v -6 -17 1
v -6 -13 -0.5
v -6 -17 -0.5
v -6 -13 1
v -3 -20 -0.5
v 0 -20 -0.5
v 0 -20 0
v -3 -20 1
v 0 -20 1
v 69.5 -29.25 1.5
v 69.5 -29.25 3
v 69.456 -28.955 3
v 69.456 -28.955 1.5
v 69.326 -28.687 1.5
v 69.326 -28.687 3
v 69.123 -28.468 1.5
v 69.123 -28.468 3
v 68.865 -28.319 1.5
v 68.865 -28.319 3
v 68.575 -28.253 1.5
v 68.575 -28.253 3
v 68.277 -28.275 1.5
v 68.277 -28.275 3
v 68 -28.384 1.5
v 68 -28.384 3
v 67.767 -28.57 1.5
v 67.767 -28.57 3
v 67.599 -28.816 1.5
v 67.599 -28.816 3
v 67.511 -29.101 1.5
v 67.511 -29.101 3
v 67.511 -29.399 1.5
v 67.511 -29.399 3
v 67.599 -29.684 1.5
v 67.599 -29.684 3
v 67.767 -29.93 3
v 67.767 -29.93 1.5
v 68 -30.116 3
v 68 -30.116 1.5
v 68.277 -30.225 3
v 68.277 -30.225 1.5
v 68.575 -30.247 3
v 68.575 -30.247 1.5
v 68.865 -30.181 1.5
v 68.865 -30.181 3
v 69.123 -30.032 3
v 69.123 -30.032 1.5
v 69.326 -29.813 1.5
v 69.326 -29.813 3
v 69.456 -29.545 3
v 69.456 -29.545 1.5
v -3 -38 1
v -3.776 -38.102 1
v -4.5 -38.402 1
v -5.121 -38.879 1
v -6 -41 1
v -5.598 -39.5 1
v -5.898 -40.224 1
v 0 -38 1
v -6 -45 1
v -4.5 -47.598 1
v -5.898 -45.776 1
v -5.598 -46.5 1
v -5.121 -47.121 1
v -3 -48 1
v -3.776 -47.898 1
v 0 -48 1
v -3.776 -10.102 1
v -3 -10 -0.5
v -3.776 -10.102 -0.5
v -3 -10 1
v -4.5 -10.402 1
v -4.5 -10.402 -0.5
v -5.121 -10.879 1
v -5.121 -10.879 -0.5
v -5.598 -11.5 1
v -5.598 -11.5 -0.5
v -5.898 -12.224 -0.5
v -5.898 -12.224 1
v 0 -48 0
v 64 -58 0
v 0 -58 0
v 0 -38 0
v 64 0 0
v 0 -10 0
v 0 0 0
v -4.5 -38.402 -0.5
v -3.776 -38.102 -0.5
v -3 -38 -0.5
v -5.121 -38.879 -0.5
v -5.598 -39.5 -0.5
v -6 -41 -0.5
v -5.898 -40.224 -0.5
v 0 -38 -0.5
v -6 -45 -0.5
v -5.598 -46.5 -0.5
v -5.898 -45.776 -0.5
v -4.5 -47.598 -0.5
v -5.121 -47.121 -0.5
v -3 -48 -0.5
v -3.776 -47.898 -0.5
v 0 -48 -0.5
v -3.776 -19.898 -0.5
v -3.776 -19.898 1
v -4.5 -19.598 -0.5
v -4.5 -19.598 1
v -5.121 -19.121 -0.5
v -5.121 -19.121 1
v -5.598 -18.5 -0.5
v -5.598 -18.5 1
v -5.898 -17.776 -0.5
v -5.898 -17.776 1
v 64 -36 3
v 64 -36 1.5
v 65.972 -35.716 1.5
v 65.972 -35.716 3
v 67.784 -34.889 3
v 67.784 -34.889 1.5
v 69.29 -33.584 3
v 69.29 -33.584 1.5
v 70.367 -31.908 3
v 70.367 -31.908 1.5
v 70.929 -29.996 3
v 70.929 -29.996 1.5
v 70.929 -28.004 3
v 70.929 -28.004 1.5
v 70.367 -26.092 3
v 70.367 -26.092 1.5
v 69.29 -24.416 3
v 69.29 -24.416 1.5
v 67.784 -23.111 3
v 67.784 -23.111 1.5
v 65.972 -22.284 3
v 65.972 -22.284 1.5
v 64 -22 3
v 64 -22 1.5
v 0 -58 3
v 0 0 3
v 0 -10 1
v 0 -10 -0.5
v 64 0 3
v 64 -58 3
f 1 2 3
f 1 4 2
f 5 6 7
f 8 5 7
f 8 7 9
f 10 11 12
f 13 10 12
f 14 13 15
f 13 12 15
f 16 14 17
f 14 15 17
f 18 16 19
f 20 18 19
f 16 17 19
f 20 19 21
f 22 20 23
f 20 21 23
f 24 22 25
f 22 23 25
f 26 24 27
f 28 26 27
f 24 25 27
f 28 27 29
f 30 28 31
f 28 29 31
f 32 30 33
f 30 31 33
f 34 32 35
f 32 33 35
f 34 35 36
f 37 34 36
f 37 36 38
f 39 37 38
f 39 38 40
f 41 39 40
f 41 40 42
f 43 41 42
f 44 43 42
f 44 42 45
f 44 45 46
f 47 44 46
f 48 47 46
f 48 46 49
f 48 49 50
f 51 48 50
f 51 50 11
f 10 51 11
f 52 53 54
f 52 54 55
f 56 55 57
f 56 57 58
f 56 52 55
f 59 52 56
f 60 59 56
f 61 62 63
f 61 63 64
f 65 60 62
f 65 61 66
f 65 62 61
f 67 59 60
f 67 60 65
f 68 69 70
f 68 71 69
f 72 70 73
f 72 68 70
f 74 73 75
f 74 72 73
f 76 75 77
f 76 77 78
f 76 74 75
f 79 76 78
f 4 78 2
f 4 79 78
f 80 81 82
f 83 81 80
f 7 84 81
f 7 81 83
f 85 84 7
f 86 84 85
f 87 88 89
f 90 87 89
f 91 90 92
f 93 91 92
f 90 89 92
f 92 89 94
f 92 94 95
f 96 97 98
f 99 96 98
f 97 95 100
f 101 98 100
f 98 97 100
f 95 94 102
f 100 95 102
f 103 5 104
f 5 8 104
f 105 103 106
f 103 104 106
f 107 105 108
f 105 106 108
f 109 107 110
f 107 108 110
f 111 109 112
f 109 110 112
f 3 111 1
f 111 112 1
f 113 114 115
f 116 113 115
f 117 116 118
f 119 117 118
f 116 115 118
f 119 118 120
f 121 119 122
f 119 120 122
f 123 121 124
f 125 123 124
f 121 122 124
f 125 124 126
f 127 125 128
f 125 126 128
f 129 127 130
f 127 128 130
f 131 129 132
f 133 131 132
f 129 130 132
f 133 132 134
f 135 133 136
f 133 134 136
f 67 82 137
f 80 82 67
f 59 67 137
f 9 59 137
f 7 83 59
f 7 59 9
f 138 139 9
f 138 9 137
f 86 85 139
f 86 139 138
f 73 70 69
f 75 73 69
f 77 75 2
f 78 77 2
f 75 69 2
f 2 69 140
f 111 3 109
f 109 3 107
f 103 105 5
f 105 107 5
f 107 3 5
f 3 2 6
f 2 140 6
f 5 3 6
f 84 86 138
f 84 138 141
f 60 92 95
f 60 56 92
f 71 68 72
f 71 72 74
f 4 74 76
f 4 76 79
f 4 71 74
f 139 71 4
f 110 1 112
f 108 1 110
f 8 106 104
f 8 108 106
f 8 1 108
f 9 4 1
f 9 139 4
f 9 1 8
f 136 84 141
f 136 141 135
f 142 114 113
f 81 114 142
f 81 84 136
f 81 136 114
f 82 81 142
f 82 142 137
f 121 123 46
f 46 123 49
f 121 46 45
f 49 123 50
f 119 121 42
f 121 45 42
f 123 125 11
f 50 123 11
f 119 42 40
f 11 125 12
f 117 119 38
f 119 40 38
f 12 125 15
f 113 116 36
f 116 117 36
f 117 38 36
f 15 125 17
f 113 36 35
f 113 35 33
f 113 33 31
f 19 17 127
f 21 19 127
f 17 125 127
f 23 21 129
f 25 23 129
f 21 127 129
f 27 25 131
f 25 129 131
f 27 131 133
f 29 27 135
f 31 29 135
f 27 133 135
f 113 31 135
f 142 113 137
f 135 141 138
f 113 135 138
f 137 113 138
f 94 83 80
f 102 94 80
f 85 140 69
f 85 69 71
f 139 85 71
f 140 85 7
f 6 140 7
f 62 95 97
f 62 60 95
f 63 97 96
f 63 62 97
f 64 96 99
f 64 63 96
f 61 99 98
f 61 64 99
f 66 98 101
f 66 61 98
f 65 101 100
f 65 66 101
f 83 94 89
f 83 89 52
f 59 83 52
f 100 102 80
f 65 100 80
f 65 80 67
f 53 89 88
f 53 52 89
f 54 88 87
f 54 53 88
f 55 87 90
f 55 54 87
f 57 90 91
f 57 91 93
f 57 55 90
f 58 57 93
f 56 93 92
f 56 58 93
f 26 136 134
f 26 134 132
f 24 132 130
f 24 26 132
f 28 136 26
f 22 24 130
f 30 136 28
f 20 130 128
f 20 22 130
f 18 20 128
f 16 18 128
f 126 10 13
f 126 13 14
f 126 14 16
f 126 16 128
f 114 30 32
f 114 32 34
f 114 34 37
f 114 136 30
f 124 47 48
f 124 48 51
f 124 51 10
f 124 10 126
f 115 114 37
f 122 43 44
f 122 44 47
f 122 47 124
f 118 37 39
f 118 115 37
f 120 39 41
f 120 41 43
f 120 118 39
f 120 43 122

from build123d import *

# Parameters (mm, degrees)
PAD_DEPTH       = 3
POCKET_DEPTH    = 1.5
SKETCH003_R     = 1
POCKET001_DEPTH = 3.001
SKETCH004_W     = 10
SKETCH004_H     = 1.5
PAD001_DEPTH    = 6
FILLET_R        = 3


with BuildPart() as part:
    # Sketch → Pad (new body)
    with BuildSketch(Plane.XY):
        with BuildLine():
            Line((0, 0), (64, 0))
            Line((64, 0), (64, -22))
            ThreePointArc((64, -36), (71, -29), (64, -22))
            Line((64, -36), (64, -58))
            Line((64, -58), (0, -58))
            Line((0, -58), (0, 0))
        make_face()
    extrude(amount=PAD_DEPTH)

    # Sketch001 (on Face7 of Pad) → Pocket (cut)
    with BuildSketch(Plane(origin=(0, 0, 0), x_dir=(1, 0, 0), z_dir=(0, 0, -1))):
        with BuildLine():
            ThreePointArc((64, 22), (71, 29), (64, 36))
            Line((64, 36), (64, 22))
        make_face()
    extrude(amount=-POCKET_DEPTH, mode=Mode.SUBTRACT)

    # Sketch003 → Pocket001 (cut, through all)
    with BuildSketch(Plane.XY.offset(3)):
        with Locations((68.5, -29.25)):
            Circle(SKETCH003_R)
    extrude(amount=-POCKET001_DEPTH, mode=Mode.SUBTRACT)

    # Sketch004 (on Face9 of Pocket001) → Pad001 (join)
    with BuildSketch(Plane(origin=(0, 0, 0), x_dir=(0, -1, 0), z_dir=(-1, 0, 0))):
        with Locations((43, 0.25)):
            Rectangle(SKETCH004_W, SKETCH004_H)
        with Locations((15, 0.25)):
            Rectangle(SKETCH004_W, SKETCH004_H)
    extrude(amount=PAD001_DEPTH)

    # Fillet
    fillet_edges = [part.edges().sort_by_distance(p)[0] for p in [
        (-6, -48, 0.25),
        (-6, -38, 0.25),
        (-6, -20, 0.25),
        (-6, -10, 0.25),
    ]]
    fillet(fillet_edges, radius=FILLET_R)


solid = part.part
